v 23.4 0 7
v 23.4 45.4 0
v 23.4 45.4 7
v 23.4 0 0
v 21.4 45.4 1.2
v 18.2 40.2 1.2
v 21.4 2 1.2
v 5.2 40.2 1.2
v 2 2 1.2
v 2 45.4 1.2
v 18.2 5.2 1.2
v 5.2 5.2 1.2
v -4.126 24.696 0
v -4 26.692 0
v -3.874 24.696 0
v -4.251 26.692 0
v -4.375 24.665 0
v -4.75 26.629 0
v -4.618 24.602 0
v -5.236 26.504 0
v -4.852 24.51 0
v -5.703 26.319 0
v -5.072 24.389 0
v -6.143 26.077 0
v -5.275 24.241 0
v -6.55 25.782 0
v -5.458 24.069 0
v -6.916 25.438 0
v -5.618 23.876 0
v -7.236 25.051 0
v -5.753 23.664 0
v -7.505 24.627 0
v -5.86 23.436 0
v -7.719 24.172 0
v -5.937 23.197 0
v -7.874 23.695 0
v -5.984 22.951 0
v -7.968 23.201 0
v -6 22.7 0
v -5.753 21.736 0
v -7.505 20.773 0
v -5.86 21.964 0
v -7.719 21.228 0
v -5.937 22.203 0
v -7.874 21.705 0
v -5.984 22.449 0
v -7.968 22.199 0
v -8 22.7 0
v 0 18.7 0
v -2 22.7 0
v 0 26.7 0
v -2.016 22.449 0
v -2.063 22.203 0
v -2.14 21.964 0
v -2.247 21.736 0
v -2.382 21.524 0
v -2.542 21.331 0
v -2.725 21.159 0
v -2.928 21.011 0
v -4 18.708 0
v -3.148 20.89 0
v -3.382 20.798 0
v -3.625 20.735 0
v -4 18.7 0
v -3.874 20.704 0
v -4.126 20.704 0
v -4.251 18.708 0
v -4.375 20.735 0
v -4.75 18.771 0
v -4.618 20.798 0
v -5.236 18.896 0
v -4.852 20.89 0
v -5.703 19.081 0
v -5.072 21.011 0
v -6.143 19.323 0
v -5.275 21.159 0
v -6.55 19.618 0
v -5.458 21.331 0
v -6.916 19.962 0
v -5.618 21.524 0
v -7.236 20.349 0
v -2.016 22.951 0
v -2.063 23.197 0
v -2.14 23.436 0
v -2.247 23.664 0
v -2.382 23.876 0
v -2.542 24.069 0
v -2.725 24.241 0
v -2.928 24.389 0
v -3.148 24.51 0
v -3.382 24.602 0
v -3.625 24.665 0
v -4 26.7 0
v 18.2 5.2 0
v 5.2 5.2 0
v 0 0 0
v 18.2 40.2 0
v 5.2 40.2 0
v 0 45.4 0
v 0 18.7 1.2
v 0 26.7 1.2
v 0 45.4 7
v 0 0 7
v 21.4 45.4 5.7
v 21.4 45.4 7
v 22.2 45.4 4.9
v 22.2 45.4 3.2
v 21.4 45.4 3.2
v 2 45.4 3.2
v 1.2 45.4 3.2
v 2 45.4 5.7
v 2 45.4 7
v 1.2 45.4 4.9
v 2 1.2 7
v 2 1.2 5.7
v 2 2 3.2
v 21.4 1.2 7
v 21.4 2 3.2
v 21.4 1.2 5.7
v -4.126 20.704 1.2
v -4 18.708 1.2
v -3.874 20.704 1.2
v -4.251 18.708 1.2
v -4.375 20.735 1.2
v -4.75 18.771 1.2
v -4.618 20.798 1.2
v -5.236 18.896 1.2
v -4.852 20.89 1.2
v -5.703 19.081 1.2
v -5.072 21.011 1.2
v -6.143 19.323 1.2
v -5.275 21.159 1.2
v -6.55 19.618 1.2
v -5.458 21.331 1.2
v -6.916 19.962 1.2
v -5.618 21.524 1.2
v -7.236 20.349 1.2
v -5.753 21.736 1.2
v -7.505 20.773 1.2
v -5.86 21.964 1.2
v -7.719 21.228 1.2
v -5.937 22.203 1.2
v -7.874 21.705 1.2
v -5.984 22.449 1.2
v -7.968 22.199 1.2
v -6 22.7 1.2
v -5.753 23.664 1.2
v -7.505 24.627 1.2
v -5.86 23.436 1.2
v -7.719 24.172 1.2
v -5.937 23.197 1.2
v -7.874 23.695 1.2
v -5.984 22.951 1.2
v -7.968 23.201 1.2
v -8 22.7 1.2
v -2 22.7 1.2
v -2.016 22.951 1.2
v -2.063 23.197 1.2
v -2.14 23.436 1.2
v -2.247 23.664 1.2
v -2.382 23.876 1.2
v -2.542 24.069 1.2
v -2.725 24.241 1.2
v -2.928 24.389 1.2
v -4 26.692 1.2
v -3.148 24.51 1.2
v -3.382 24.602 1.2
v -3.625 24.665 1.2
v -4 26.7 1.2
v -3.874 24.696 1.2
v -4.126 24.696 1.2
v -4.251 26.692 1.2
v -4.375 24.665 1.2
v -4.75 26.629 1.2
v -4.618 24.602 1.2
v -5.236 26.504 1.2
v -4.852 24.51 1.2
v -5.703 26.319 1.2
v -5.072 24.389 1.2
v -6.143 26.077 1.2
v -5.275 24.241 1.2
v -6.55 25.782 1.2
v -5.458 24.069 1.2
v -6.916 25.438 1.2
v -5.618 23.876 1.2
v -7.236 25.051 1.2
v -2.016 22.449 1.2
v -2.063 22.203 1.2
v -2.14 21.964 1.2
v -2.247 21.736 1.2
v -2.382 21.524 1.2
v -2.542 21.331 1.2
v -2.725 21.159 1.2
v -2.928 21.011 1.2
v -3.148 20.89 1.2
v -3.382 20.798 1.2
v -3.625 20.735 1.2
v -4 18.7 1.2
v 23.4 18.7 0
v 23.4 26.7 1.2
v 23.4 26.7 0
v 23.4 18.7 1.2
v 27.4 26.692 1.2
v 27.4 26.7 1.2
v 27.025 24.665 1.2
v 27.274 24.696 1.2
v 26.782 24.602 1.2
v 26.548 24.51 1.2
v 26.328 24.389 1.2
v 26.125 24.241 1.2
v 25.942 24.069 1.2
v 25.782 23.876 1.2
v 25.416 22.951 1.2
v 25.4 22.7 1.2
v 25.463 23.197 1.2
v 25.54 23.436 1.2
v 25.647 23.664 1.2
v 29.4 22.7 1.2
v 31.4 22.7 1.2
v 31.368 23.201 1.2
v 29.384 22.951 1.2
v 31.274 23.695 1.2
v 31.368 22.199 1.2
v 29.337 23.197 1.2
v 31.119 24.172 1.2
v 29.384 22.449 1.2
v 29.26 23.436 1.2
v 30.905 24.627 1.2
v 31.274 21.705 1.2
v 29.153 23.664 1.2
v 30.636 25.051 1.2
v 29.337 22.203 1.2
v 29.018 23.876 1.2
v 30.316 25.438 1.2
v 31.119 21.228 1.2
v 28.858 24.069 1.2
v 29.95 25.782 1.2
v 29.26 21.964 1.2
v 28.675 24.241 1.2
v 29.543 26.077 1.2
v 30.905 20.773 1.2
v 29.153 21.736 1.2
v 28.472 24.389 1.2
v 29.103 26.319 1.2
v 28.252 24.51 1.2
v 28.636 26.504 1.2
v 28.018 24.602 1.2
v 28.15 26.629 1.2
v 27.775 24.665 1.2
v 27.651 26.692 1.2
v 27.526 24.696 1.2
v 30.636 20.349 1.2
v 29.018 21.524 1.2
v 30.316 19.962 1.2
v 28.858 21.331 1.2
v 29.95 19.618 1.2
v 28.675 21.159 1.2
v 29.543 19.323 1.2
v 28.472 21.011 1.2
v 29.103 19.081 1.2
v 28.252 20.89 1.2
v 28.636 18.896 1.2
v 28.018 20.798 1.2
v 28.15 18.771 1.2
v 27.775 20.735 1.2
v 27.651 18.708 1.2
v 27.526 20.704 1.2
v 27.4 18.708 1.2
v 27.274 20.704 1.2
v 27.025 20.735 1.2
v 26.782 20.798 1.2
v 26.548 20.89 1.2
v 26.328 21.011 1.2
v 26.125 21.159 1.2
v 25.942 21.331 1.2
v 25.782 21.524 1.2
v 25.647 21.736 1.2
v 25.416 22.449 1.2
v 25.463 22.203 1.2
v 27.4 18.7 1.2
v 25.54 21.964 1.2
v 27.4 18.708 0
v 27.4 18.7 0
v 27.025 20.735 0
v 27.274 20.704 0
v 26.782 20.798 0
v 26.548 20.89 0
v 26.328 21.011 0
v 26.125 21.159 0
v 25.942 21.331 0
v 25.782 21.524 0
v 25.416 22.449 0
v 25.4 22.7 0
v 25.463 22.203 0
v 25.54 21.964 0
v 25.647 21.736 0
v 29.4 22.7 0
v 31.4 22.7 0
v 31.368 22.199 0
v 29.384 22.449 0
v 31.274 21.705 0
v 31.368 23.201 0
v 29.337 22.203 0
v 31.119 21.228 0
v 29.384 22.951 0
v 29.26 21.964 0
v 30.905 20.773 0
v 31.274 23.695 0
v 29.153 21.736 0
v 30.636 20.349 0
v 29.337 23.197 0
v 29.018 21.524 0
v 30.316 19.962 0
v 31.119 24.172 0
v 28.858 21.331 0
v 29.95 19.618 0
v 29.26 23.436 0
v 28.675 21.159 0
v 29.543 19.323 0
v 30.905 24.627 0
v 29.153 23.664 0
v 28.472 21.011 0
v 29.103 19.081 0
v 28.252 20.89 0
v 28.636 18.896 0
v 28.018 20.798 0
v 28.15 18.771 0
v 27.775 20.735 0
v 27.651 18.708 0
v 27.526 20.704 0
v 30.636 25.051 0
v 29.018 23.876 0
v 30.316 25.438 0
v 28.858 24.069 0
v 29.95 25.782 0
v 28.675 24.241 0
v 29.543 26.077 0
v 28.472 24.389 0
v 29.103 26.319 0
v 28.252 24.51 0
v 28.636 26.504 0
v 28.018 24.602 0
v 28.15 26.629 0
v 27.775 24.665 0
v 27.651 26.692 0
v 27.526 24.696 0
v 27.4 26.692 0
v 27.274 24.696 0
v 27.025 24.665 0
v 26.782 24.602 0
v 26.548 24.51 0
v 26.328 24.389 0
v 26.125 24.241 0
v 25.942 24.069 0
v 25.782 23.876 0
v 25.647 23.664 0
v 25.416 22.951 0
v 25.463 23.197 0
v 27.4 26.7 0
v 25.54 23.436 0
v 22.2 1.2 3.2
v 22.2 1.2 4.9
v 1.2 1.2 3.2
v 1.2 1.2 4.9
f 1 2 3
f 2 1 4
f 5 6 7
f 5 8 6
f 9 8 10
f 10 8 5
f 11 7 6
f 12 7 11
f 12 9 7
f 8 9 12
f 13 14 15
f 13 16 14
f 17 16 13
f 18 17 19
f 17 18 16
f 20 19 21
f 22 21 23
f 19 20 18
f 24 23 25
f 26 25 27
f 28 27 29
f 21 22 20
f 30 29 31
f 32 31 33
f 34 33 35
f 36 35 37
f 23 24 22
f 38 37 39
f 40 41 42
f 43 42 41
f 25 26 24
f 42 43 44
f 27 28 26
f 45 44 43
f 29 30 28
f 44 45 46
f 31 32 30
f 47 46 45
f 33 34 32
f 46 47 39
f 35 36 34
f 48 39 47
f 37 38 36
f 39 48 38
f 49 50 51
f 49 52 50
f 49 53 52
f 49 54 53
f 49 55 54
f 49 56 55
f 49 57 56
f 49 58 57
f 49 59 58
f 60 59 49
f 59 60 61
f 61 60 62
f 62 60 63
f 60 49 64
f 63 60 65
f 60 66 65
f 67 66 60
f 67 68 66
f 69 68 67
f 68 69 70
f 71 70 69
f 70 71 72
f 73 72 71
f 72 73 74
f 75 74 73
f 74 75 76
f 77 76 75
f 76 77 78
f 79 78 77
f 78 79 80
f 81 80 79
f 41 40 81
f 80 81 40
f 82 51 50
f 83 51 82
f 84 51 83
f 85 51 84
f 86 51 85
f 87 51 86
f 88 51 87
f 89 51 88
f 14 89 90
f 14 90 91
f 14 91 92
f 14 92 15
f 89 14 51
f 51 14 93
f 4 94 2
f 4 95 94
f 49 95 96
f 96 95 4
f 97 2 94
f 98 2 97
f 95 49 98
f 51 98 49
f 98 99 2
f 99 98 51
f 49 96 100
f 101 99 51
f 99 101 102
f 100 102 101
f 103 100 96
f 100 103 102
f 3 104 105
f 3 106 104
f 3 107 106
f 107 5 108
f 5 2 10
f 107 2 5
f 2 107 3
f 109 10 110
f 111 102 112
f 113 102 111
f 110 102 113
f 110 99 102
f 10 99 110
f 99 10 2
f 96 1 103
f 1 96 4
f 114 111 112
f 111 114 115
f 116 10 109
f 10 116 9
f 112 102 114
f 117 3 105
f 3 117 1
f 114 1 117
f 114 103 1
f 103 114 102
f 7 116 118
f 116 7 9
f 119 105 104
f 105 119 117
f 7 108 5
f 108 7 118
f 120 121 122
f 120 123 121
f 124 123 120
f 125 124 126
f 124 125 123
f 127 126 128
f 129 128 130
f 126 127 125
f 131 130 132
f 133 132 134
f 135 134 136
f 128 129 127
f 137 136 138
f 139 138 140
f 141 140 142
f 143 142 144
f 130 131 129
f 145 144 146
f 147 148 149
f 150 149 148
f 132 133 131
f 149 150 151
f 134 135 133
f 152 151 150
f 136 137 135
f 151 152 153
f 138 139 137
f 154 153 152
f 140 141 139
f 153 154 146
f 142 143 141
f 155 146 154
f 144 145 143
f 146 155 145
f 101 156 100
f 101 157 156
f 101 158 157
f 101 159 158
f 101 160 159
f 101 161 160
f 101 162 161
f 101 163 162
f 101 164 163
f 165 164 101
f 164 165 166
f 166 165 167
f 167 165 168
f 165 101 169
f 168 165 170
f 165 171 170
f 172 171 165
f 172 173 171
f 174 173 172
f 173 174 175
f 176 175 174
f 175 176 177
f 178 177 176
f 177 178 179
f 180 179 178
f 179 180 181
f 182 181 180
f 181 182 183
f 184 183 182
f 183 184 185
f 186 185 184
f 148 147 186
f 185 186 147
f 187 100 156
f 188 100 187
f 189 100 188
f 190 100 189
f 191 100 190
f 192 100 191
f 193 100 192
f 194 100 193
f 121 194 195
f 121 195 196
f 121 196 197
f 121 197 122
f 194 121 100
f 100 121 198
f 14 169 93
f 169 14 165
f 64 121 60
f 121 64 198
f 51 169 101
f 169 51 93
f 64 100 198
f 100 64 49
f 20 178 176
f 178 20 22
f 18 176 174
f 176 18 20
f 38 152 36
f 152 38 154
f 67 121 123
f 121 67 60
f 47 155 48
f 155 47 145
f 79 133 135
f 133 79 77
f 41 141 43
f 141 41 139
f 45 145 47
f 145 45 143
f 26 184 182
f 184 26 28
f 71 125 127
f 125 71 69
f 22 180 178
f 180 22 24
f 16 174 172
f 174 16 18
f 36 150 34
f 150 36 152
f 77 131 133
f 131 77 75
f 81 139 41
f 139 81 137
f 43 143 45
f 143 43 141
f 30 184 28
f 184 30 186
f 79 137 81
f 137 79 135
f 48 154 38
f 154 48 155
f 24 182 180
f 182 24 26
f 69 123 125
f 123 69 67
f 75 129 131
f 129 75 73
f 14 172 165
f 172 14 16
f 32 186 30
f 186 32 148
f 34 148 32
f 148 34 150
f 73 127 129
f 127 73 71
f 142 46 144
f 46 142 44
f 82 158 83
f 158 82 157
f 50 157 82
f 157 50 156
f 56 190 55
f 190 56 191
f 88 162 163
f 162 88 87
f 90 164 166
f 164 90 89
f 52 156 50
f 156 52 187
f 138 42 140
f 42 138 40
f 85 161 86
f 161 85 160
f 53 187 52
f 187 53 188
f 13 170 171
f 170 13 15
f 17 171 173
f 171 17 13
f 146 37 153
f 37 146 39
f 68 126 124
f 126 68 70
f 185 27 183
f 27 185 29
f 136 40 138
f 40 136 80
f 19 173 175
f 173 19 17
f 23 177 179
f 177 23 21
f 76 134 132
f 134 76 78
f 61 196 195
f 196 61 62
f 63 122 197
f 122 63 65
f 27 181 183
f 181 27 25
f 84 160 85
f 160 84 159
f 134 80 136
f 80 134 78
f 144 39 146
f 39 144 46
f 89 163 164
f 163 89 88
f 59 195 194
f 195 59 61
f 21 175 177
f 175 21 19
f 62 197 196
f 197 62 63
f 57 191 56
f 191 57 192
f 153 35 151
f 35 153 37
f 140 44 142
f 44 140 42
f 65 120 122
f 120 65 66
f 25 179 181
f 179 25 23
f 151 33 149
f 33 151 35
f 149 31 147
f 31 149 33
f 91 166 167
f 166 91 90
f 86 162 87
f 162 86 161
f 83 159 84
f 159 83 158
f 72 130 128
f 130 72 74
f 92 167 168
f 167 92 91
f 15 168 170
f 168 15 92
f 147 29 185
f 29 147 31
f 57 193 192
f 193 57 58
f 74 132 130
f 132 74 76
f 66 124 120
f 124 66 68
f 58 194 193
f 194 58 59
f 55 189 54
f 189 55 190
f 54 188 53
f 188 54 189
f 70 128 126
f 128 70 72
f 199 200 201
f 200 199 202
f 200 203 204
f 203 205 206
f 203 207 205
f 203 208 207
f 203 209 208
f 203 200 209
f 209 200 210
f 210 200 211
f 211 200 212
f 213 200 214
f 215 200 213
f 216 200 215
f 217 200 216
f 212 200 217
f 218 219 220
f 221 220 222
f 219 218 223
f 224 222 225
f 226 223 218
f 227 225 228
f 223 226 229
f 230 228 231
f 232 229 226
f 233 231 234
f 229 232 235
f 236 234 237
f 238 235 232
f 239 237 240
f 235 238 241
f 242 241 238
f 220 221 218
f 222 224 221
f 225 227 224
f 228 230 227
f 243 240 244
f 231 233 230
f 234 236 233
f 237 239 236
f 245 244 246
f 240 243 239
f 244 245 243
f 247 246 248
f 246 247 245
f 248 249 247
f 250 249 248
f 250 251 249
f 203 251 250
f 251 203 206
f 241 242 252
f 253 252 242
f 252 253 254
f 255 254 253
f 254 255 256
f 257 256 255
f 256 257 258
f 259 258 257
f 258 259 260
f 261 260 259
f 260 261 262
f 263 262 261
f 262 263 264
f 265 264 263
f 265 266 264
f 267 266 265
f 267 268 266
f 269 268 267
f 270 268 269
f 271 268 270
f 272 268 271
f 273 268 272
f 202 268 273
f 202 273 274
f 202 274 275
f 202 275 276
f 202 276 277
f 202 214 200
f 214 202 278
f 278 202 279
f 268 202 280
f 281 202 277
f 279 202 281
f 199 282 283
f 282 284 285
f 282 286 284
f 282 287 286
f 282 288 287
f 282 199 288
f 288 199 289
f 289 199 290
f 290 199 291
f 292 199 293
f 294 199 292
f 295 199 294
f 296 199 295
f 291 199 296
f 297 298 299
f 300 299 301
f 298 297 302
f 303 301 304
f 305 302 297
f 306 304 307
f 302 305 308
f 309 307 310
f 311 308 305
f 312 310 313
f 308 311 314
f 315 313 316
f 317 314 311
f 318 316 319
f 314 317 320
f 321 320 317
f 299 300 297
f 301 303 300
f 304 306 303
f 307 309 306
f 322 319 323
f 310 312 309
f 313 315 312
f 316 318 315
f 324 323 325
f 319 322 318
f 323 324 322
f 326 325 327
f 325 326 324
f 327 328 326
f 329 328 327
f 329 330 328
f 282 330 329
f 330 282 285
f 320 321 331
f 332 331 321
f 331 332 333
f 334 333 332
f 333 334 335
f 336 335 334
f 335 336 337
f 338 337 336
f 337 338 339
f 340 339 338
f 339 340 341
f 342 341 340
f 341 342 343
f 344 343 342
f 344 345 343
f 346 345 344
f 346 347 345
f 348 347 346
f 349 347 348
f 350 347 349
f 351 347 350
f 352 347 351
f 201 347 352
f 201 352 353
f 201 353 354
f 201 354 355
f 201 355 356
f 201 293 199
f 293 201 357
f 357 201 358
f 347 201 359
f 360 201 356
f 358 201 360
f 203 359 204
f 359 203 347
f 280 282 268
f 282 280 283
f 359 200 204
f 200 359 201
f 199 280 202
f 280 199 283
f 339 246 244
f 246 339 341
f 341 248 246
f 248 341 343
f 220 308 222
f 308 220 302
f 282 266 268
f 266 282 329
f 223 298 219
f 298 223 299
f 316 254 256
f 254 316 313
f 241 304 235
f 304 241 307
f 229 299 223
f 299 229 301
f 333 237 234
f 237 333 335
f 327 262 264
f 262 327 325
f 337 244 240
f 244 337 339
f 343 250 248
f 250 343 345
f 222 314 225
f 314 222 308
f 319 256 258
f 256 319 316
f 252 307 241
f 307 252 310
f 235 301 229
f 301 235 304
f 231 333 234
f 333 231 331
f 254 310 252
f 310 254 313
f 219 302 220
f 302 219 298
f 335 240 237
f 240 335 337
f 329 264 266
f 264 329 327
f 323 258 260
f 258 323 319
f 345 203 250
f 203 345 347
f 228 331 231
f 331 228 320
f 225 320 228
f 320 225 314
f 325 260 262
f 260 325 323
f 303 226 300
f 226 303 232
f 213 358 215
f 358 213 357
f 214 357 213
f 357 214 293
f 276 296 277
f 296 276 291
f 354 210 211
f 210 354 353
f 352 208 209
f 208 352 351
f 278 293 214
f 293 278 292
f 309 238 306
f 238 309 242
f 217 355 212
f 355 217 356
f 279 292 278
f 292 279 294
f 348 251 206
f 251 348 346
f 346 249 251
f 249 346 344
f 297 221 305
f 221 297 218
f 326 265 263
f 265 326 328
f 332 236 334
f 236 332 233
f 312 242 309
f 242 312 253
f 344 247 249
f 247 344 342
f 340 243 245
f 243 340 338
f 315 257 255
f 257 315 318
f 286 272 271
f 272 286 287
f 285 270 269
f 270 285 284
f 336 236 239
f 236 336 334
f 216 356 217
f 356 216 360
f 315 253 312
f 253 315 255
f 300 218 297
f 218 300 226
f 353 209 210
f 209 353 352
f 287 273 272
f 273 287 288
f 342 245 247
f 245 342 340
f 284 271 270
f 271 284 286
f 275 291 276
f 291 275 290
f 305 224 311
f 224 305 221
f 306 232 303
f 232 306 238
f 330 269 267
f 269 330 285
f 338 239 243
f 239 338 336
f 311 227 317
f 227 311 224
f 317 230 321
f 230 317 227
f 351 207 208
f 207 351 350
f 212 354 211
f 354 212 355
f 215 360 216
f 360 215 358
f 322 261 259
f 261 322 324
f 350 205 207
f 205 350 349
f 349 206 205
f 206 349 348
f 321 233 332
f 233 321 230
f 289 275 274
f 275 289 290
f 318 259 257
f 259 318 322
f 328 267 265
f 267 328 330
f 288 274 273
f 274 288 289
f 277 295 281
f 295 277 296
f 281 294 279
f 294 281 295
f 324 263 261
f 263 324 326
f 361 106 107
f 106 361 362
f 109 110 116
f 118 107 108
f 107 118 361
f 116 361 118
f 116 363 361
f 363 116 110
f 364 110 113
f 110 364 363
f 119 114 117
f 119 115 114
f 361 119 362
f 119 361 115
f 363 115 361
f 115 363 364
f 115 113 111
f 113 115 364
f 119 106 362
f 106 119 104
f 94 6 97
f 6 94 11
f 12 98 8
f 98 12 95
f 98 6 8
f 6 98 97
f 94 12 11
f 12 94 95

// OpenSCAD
// file: ../lib/pcb_led_cvf.scad
// for led power module modified

/* bluetooth_mate_holder.scad
 * By John Biehler - November 17, 2011
 * http://www.thingiverse.com/thing:

 * derived from pcb_box_slide_with_tabs.scad
 * By Nicholas C Lewis - Jan 1, 2011
 * http://www.thingiverse.com/thing:5396
 *
 * derived from pcb_box_slide.scad
 *     Parametric, open PCB-box (slide-in) by chlunde
 *     http://www.thingiverse.com/thing:4071
 *
 * CHANGES
 * - adjusted to fit Arduino Mega
 * - added mounting tabs
 * - turned off cutouts
 * - adjusted bottom cutout size
 */

$fn=50;

module pcb_led_cvf(

	pcb_width = 48.2,
	pcb_length =24.1,
	pcb_height =1.1,
	slisse = 0.8,

	pcb_bottom_margin = 1,
	wall_width_thick = 2,
	box_height = 7,

	//tab parameters
	tab_hole_radius=2,
	tab_outer_radius=4,

	inner_margin = 4,

	add_tabs = true

) {
	wall_width = wall_width_thick-slisse;

module tab() {
	difference(){
		union() {
			translate([-tab_outer_radius,-tab_outer_radius,0])
			cube([tab_outer_radius,2*tab_outer_radius,wall_width]);
			translate([-tab_outer_radius,0,0])
				cylinder(r=tab_outer_radius, h = wall_width);
		}
		translate([-tab_outer_radius,0,0])
		 cylinder(r= tab_hole_radius, h = wall_width+3,center=true);
	}

}

module box() {
	union() {
		cube([pcb_width + 2*wall_width, pcb_length + 2*wall_width, wall_width]);

		cube([wall_width_thick, pcb_length + 2*wall_width, box_height]);

		cube([pcb_width + 2*wall_width, wall_width_thick, box_height]);

		%translate([0, pcb_length+wall_width, 0])
			cube([pcb_width + 2*wall_width,wall_width,box_height]);

		translate([pcb_width + wall_width - slisse,0,0])
			cube([wall_width_thick, pcb_length + 2*wall_width, box_height]);
	}
	if(add_tabs) {
//comment out this part to remove tabs
		for(i=[(pcb_length + 2*wall_width)/2]){
	translate([0,i,0])tab();
	translate([pcb_width + 2*wall_width,i,0])mirror()tab();
		}
	}

}

module pcb() {
	translate([wall_width, wall_width, wall_width + pcb_bottom_margin])
		cube([pcb_width,pcb_length + wall_width + 0.1,pcb_height]);
	translate([wall_width, wall_width, wall_width + pcb_bottom_margin+pcb_height])rotate([0,45,0])
		cube([pcb_height,pcb_length + wall_width + 0.1,pcb_height]);
	translate([wall_width+pcb_width-2*cos(45)*pcb_height, wall_width, wall_width + pcb_bottom_margin+pcb_height])rotate([0,45,0])
		cube([pcb_height,pcb_length + wall_width + 0.1,pcb_height]);
	translate([wall_width_thick, wall_width, wall_width + pcb_bottom_margin])
		cube([pcb_width-2*slisse,pcb_length + wall_width + 0.1,box_height]);

}



module holes() {
		*translate([wall_width + pcb_width/2, wall_width_thick + 0.1, pcb_width/2+wall_width])
			rotate(a=90,v=[1,0,0])
				cylinder(r=pcb_width/2, h=wall_width_thick + 0.2);

		*translate([-0.1, wall_width + pcb_length/2, pcb_length/2 + wall_width])
			rotate(a=90,v=[0,1,0])
				cylinder(r=pcb_length/2, h=wall_width_thick + 0.2);

		*translate([pcb_width + wall_width - slisse - 0.1, wall_width + pcb_length/2, pcb_length/2 + wall_width])
			rotate(a=90,v=[0,1,0])
				cylinder(r=pcb_length/2, h=wall_width_thick + 0.2);

	 * translate([pcb_width/2 + wall_width, wall_width + pcb_length/2, -0.1])
			rotate(a=0,v=[0,1,0])
				cylinder(r=min(pcb_length,pcb_width)/2 - wall_width/2, h=wall_width_thick + 0.2);

		translate([inner_margin +wall_width, inner_margin+wall_width, -0.1])
			cube([pcb_width-inner_margin*2,pcb_length -inner_margin*2,wall_width + 0.2]);
}

	difference() {
		box();
		pcb();
		holes();
	}
}



pcb_led_cvf();
// main file
use <../lib/pcb_led_cvf.scad>


pcb_led_cvf(
  pcb_length=43,
  pcb_width=21,
  pcb_height=1.7,
  pcb_bottom_margin=2
);
